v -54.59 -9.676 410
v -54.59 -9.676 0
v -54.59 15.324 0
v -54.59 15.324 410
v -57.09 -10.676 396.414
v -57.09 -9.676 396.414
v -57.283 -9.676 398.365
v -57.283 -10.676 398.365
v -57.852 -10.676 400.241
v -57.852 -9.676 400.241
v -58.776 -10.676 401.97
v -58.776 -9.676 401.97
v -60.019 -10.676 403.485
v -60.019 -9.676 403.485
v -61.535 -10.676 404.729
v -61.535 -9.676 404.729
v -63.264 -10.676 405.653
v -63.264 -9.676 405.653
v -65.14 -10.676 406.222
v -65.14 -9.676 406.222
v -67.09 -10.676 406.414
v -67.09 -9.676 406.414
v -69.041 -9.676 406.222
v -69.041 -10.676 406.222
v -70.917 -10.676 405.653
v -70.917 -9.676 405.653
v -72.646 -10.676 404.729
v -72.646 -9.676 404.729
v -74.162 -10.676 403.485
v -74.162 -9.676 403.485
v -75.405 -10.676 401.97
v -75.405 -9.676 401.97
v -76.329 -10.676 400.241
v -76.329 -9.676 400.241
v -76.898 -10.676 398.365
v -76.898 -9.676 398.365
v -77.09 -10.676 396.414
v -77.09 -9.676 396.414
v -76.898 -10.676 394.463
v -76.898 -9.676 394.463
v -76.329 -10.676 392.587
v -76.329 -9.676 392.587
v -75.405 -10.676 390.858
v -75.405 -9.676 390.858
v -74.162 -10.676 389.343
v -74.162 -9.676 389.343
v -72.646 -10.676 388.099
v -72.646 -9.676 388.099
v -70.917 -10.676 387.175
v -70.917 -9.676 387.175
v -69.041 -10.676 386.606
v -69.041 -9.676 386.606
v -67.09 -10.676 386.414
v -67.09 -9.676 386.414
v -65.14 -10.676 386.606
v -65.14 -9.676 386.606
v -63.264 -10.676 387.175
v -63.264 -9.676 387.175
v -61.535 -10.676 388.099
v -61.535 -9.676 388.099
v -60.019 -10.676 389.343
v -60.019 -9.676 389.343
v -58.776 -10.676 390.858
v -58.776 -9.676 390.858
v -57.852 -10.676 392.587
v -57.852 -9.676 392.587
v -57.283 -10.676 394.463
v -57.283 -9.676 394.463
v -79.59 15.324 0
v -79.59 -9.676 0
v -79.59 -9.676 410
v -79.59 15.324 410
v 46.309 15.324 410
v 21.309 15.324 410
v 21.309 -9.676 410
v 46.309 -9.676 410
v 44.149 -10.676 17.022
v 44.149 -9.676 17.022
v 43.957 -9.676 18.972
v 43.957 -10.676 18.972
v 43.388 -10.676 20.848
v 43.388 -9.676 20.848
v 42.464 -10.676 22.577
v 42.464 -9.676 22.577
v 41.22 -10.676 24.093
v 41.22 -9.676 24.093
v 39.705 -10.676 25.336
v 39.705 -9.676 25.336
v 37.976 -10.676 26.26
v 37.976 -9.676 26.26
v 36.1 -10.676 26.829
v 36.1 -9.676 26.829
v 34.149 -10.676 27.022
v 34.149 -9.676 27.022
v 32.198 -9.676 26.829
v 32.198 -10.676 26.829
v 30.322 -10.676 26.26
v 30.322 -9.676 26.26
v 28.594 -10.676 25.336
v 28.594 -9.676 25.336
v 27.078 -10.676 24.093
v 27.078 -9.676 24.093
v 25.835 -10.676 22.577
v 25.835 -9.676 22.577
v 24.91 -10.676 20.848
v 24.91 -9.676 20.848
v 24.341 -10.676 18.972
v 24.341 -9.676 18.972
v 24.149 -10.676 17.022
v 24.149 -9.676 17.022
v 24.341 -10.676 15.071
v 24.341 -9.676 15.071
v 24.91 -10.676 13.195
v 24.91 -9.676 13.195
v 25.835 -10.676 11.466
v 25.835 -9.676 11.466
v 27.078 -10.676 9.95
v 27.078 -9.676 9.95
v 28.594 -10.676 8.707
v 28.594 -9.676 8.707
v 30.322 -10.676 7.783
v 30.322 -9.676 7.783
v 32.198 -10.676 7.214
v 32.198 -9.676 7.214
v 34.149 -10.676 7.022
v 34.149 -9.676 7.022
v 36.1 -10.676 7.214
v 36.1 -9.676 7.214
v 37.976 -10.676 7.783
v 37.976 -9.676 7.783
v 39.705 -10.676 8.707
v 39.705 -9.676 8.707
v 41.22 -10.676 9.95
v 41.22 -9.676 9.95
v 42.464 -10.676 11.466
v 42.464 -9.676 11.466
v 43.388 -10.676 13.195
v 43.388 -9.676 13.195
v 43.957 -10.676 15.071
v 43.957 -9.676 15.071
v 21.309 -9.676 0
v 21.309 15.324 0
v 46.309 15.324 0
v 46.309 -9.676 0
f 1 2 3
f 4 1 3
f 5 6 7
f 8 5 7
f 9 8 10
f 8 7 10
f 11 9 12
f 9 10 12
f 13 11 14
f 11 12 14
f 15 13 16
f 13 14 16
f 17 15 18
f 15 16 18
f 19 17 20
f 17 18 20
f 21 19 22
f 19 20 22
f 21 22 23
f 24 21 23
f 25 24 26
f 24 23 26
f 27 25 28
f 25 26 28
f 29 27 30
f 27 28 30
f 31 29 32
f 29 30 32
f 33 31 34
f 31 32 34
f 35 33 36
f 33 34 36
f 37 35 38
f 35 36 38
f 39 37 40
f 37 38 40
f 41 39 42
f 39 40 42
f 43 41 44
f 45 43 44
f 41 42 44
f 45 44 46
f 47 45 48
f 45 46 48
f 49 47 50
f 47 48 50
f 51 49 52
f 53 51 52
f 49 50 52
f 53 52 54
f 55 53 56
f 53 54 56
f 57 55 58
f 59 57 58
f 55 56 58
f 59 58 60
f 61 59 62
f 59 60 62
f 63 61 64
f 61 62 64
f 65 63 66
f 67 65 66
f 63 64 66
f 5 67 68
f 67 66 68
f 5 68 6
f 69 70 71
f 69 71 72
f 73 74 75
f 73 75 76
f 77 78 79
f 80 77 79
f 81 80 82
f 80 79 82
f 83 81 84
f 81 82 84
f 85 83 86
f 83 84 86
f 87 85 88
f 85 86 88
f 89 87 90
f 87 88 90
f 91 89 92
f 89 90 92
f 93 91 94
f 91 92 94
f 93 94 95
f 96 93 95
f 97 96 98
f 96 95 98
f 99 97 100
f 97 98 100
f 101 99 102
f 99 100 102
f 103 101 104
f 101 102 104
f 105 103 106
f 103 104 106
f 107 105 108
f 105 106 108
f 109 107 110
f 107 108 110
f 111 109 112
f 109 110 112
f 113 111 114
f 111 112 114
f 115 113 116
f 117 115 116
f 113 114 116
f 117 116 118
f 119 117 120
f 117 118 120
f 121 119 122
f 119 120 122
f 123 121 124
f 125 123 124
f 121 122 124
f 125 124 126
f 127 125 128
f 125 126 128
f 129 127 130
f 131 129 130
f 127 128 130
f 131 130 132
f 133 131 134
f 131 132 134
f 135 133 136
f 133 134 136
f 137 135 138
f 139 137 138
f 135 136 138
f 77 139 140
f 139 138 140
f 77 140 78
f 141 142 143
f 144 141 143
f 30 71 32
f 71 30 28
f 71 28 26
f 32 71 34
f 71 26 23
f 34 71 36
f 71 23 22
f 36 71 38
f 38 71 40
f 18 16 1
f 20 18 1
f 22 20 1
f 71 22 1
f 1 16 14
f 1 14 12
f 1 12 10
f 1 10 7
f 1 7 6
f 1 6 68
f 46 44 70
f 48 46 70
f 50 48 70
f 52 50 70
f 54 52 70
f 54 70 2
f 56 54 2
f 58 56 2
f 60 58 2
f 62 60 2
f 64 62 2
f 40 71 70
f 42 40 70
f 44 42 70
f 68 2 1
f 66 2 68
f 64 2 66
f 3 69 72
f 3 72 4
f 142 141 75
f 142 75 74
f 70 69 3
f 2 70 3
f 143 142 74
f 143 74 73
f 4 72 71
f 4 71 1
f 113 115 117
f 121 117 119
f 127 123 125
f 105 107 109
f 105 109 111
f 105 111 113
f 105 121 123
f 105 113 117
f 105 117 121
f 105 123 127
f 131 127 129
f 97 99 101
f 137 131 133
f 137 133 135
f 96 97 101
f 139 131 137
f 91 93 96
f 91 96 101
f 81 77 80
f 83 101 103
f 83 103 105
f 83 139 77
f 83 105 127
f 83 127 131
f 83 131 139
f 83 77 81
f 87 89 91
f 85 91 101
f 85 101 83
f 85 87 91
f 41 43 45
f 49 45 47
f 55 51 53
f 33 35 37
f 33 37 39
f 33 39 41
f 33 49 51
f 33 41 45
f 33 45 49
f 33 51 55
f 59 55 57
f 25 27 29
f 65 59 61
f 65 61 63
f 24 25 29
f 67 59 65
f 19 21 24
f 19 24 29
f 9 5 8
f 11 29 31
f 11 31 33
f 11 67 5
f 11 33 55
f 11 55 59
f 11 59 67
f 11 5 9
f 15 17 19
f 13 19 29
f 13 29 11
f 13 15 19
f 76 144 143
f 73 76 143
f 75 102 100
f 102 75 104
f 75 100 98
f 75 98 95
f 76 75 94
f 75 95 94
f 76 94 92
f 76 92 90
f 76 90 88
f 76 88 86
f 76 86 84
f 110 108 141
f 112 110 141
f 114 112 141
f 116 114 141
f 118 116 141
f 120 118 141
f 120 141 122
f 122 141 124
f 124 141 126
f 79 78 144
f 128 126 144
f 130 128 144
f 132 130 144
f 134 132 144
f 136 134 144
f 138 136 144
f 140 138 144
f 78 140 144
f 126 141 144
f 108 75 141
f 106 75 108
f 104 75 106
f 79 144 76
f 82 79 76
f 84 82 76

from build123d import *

# Parameters (mm, degrees)
F0_W     = 25
F0_H     = 25
F1_DEPTH = 410
F2_R     = 10
F3_DEPTH = 1
F4_DEPTH = 1


with BuildPart() as f1:
    # F0 (on Top) → F1 (new body)
    with BuildSketch(Plane.XY):
        with Locations((-67.090479, 2.824143)):
            Rectangle(F0_W, F0_H)
        with Locations((33.80853, 2.824143)):
            Rectangle(F0_W, F0_H)
    extrude(amount=F1_DEPTH)

    # F2 (on face) → F3 (join)
    with BuildSketch(Plane.XZ.offset(9.675857)):
        with Locations((-67.090479, 396.413863)):
            Circle(F2_R)
    extrude(amount=F3_DEPTH)

    # F2 (on face) → F4 (join)
    with BuildSketch(Plane.XZ.offset(9.675857)):
        with Locations((34.149244, 17.021533)):
            Circle(F2_R)
    extrude(amount=F4_DEPTH)


solid = f1.part
